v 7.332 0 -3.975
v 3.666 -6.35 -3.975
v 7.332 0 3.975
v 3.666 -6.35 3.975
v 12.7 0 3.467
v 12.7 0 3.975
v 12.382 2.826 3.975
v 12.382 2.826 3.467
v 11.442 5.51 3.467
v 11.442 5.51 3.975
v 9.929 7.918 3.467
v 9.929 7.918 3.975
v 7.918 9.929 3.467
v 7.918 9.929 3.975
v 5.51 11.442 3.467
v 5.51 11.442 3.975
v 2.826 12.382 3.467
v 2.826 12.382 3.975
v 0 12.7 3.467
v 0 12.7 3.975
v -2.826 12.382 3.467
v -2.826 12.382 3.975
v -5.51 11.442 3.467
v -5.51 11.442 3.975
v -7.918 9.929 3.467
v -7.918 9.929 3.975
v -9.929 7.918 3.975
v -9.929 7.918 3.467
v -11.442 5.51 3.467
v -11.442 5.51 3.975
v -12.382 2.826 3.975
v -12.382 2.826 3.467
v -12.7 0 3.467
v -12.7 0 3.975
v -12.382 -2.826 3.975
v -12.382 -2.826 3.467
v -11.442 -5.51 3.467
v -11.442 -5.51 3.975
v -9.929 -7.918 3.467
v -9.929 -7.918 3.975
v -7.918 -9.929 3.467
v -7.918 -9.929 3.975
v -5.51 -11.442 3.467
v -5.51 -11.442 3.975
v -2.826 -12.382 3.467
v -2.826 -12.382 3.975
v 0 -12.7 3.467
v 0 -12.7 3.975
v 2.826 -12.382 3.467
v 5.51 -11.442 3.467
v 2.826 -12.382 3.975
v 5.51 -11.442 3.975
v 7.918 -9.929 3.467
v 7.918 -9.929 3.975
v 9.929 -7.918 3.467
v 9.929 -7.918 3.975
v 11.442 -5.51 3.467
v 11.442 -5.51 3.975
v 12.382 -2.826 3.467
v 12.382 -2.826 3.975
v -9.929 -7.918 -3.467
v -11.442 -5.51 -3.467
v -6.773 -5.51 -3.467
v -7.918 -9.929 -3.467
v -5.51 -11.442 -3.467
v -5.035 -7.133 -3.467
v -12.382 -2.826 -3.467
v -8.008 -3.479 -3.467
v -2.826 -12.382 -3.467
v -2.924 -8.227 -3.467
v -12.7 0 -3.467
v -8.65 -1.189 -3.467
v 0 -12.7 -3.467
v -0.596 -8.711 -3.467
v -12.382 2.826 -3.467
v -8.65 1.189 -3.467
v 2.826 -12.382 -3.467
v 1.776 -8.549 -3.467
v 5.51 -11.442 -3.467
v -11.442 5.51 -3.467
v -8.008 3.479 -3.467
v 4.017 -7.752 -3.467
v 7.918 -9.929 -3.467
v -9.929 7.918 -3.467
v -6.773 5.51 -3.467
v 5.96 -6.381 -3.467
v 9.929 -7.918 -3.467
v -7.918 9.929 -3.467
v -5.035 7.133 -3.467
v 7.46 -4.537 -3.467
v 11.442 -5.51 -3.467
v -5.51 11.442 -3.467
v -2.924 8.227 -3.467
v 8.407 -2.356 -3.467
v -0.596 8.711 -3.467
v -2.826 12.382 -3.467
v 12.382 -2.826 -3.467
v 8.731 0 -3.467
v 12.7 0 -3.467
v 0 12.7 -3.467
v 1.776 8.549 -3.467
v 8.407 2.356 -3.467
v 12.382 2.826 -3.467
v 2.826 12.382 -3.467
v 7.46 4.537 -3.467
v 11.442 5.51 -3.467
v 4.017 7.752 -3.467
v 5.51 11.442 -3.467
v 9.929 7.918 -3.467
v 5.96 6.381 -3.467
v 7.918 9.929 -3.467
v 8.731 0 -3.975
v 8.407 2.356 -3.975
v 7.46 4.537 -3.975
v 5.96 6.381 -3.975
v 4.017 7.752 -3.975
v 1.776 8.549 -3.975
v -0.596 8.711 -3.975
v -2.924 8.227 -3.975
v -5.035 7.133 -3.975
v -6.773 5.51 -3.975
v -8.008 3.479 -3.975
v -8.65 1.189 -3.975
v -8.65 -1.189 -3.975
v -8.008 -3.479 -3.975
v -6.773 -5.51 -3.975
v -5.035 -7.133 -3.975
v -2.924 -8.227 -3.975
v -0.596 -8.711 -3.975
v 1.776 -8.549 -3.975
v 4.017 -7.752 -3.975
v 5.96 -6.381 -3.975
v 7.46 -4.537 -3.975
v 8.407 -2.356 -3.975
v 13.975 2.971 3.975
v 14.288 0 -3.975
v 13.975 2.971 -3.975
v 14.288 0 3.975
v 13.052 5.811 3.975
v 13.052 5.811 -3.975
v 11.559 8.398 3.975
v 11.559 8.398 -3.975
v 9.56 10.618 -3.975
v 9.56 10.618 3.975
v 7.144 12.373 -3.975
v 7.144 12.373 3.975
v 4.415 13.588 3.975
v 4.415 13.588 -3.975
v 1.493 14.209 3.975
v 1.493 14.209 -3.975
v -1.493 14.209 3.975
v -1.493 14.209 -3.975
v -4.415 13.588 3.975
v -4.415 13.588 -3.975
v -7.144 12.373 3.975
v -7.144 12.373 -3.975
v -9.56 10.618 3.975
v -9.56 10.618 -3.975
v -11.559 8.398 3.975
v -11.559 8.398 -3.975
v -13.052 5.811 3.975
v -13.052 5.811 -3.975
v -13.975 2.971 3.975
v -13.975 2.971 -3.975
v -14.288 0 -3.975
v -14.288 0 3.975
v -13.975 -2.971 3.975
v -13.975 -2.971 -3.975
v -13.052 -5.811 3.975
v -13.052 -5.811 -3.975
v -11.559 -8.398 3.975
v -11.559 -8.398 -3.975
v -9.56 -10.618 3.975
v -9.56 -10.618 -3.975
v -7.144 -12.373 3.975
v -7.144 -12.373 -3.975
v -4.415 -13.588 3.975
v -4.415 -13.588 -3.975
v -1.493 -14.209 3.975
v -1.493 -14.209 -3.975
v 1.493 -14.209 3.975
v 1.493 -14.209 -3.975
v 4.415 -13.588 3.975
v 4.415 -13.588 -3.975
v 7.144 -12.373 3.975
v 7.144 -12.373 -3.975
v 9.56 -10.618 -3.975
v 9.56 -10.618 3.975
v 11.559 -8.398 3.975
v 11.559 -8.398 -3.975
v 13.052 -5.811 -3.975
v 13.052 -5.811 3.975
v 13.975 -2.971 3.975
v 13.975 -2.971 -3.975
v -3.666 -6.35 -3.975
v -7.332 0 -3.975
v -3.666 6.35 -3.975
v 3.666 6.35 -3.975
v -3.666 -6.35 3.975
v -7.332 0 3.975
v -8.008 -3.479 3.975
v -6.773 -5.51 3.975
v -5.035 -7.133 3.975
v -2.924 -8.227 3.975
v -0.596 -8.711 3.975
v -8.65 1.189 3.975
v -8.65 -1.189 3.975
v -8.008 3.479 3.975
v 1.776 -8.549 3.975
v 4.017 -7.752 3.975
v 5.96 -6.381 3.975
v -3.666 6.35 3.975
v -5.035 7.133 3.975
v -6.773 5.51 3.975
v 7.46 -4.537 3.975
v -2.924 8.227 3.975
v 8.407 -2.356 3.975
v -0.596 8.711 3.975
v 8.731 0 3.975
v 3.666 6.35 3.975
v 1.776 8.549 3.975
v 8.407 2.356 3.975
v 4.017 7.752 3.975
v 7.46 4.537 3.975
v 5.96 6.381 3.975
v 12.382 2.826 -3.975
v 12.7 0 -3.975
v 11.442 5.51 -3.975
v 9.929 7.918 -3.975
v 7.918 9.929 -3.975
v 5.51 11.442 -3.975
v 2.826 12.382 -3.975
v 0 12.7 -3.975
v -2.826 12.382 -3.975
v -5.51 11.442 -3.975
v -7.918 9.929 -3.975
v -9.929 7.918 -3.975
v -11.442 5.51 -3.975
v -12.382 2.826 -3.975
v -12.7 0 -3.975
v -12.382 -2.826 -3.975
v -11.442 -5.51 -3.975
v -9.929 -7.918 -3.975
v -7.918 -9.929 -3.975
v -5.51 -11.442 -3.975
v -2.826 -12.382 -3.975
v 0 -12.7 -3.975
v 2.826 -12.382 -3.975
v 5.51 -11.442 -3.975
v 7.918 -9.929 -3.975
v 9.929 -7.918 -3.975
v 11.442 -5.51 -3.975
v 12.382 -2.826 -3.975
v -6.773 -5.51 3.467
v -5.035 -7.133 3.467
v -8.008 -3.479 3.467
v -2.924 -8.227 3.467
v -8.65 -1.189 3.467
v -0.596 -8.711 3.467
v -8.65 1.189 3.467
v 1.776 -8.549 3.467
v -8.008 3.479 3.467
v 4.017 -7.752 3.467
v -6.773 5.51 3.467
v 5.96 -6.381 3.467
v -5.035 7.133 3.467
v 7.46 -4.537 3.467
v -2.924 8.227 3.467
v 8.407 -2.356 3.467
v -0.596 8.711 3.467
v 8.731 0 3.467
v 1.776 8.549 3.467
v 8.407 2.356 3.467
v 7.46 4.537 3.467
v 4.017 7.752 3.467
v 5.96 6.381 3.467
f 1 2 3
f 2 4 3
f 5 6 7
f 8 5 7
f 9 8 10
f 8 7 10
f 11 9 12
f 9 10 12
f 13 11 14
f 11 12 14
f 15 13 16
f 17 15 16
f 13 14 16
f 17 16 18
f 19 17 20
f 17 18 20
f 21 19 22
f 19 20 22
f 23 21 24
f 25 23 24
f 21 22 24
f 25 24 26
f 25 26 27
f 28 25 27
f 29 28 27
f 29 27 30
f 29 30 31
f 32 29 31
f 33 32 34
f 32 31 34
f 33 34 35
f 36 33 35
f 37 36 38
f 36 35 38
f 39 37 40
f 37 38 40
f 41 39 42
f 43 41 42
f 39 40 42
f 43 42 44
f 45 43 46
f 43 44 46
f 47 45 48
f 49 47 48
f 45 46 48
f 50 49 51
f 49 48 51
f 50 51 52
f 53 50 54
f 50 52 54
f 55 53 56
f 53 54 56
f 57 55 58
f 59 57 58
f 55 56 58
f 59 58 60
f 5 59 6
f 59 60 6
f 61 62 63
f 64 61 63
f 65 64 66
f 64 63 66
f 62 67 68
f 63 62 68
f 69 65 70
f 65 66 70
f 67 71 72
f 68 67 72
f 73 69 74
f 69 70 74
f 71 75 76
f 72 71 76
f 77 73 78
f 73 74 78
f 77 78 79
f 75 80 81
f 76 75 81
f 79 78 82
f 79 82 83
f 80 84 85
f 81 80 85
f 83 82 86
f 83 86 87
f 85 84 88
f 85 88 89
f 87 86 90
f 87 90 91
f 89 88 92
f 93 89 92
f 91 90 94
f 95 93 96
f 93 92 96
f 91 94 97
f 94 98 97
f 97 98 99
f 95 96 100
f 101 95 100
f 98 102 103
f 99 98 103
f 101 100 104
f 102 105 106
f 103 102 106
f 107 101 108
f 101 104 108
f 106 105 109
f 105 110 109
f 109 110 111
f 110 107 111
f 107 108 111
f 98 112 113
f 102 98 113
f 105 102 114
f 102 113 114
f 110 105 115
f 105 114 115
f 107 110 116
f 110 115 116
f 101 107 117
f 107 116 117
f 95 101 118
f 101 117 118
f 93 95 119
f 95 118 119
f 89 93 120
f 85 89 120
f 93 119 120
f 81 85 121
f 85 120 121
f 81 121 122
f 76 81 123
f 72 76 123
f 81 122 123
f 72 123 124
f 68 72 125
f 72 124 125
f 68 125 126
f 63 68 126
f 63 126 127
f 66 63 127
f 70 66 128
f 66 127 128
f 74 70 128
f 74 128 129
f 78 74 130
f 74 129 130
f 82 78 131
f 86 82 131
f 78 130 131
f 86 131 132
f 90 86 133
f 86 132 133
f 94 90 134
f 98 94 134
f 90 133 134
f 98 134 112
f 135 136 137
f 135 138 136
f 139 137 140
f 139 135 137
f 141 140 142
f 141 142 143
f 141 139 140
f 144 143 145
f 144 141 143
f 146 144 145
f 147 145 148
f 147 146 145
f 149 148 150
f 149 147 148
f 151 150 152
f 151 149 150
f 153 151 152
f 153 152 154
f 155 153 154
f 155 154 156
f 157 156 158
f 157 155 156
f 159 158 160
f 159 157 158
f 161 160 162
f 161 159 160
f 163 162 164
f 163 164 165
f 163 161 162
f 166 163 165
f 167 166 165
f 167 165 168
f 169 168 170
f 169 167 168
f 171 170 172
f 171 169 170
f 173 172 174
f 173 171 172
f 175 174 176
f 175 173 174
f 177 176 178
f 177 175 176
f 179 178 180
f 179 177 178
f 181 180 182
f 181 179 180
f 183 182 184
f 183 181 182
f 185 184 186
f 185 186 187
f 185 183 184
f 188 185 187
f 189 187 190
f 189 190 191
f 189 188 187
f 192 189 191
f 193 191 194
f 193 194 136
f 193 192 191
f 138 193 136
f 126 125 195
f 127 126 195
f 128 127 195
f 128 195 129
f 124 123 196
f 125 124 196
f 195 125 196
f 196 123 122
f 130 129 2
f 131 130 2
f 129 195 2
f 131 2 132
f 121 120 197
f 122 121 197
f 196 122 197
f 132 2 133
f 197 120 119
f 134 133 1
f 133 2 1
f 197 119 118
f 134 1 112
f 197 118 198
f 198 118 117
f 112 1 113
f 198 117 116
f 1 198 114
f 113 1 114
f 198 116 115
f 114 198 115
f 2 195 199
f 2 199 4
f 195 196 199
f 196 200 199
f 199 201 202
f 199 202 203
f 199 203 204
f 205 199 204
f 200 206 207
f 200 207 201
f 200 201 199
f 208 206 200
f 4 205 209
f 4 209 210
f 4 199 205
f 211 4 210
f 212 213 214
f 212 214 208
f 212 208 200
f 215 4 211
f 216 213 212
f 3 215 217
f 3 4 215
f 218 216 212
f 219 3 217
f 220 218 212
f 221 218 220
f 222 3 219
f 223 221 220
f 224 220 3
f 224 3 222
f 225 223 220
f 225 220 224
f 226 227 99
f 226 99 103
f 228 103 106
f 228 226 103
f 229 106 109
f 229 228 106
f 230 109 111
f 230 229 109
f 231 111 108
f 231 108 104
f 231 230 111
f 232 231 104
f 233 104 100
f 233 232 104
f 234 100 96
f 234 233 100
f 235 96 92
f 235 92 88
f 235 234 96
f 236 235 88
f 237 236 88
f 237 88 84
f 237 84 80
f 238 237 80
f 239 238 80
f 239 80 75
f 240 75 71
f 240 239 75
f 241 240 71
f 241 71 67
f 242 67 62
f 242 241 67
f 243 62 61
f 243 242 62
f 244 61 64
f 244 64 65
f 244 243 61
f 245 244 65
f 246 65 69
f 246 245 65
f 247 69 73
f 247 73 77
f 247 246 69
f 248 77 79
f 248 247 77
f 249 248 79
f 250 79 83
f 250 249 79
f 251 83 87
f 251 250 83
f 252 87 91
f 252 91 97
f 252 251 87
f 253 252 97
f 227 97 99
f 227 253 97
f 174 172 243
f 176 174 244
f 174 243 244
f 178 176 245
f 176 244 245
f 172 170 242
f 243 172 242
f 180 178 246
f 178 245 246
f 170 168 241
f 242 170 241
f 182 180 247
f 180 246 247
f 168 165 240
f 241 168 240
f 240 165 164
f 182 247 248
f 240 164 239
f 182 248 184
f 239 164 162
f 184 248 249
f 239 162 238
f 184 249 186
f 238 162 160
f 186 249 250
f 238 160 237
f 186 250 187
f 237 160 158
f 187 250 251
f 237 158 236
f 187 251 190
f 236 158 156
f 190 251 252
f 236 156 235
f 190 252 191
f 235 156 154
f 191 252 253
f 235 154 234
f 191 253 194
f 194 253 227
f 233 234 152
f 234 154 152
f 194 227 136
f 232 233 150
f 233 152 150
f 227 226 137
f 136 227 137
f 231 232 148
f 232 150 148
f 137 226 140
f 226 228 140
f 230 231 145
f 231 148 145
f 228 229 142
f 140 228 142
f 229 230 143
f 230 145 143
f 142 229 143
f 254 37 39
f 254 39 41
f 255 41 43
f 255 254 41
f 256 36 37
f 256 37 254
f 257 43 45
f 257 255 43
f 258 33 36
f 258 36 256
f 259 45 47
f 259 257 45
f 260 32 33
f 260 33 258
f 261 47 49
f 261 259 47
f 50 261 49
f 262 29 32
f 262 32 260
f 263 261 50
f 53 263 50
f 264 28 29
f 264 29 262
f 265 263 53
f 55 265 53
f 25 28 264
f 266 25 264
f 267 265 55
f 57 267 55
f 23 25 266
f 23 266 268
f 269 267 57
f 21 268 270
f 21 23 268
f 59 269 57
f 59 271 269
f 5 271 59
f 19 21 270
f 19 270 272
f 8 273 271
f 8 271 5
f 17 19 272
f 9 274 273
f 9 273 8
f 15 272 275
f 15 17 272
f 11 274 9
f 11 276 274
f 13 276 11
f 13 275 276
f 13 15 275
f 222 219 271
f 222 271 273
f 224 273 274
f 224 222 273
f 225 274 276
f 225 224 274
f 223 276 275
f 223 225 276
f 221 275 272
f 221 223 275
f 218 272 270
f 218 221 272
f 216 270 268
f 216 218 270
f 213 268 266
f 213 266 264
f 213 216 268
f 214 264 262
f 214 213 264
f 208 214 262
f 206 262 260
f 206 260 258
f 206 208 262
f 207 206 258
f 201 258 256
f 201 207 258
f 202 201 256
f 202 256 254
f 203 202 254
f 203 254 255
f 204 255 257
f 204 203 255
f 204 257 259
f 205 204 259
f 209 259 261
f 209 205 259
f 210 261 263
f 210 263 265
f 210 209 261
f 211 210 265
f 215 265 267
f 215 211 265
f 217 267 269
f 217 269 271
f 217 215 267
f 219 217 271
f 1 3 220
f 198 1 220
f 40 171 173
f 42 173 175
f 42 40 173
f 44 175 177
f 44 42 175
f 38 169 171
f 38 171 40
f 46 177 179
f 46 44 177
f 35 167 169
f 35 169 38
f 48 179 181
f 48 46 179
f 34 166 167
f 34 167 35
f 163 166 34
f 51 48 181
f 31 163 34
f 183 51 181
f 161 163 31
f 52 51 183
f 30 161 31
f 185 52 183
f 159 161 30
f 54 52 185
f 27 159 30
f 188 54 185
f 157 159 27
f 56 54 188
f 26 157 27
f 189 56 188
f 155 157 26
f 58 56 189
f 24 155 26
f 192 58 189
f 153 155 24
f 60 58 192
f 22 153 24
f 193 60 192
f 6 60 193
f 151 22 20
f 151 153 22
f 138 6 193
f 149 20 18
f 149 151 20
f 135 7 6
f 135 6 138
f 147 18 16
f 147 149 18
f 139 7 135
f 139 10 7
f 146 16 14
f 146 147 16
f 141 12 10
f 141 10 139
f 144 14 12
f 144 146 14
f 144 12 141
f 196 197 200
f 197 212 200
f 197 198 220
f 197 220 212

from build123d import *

# Parameters (mm, degrees)
SKETCH1_R           = 14.2875
BOSS_EXTRUDE1_DEPTH = 3.9751
SKETCH2_R           = 12.7
SKETCH2_R_2         = 8.73125
CUT_EXTRUDE1_DEPTH  = 0.508


with BuildPart() as part:
    # Sketch1 → Boss-Extrude1 (new body, symmetric)
    with BuildSketch(Plane.XY):
        Circle(SKETCH1_R)
        Polygon((7.332348419, 0), (3.666174209, 6.35), (-3.666174209, 6.35), (-7.332348419, 0), (-3.666174209, -6.35), (3.666174209, -6.35), align=None, mode=Mode.SUBTRACT)
    extrude(amount=BOSS_EXTRUDE1_DEPTH, both=True)

    # Sketch2 → Cut-Extrude1 (cut)
    with BuildSketch(Plane.XY.offset(3.9751)):
        Circle(SKETCH2_R)
        Circle(SKETCH2_R_2, mode=Mode.SUBTRACT)
    cut_extrude1 = extrude(amount=-CUT_EXTRUDE1_DEPTH, mode=Mode.SUBTRACT)

    # Mirror1: Cut-Extrude1 across plane
    add(cut_extrude1.mirror(Plane.XY), mode=Mode.SUBTRACT)


solid = part.part
